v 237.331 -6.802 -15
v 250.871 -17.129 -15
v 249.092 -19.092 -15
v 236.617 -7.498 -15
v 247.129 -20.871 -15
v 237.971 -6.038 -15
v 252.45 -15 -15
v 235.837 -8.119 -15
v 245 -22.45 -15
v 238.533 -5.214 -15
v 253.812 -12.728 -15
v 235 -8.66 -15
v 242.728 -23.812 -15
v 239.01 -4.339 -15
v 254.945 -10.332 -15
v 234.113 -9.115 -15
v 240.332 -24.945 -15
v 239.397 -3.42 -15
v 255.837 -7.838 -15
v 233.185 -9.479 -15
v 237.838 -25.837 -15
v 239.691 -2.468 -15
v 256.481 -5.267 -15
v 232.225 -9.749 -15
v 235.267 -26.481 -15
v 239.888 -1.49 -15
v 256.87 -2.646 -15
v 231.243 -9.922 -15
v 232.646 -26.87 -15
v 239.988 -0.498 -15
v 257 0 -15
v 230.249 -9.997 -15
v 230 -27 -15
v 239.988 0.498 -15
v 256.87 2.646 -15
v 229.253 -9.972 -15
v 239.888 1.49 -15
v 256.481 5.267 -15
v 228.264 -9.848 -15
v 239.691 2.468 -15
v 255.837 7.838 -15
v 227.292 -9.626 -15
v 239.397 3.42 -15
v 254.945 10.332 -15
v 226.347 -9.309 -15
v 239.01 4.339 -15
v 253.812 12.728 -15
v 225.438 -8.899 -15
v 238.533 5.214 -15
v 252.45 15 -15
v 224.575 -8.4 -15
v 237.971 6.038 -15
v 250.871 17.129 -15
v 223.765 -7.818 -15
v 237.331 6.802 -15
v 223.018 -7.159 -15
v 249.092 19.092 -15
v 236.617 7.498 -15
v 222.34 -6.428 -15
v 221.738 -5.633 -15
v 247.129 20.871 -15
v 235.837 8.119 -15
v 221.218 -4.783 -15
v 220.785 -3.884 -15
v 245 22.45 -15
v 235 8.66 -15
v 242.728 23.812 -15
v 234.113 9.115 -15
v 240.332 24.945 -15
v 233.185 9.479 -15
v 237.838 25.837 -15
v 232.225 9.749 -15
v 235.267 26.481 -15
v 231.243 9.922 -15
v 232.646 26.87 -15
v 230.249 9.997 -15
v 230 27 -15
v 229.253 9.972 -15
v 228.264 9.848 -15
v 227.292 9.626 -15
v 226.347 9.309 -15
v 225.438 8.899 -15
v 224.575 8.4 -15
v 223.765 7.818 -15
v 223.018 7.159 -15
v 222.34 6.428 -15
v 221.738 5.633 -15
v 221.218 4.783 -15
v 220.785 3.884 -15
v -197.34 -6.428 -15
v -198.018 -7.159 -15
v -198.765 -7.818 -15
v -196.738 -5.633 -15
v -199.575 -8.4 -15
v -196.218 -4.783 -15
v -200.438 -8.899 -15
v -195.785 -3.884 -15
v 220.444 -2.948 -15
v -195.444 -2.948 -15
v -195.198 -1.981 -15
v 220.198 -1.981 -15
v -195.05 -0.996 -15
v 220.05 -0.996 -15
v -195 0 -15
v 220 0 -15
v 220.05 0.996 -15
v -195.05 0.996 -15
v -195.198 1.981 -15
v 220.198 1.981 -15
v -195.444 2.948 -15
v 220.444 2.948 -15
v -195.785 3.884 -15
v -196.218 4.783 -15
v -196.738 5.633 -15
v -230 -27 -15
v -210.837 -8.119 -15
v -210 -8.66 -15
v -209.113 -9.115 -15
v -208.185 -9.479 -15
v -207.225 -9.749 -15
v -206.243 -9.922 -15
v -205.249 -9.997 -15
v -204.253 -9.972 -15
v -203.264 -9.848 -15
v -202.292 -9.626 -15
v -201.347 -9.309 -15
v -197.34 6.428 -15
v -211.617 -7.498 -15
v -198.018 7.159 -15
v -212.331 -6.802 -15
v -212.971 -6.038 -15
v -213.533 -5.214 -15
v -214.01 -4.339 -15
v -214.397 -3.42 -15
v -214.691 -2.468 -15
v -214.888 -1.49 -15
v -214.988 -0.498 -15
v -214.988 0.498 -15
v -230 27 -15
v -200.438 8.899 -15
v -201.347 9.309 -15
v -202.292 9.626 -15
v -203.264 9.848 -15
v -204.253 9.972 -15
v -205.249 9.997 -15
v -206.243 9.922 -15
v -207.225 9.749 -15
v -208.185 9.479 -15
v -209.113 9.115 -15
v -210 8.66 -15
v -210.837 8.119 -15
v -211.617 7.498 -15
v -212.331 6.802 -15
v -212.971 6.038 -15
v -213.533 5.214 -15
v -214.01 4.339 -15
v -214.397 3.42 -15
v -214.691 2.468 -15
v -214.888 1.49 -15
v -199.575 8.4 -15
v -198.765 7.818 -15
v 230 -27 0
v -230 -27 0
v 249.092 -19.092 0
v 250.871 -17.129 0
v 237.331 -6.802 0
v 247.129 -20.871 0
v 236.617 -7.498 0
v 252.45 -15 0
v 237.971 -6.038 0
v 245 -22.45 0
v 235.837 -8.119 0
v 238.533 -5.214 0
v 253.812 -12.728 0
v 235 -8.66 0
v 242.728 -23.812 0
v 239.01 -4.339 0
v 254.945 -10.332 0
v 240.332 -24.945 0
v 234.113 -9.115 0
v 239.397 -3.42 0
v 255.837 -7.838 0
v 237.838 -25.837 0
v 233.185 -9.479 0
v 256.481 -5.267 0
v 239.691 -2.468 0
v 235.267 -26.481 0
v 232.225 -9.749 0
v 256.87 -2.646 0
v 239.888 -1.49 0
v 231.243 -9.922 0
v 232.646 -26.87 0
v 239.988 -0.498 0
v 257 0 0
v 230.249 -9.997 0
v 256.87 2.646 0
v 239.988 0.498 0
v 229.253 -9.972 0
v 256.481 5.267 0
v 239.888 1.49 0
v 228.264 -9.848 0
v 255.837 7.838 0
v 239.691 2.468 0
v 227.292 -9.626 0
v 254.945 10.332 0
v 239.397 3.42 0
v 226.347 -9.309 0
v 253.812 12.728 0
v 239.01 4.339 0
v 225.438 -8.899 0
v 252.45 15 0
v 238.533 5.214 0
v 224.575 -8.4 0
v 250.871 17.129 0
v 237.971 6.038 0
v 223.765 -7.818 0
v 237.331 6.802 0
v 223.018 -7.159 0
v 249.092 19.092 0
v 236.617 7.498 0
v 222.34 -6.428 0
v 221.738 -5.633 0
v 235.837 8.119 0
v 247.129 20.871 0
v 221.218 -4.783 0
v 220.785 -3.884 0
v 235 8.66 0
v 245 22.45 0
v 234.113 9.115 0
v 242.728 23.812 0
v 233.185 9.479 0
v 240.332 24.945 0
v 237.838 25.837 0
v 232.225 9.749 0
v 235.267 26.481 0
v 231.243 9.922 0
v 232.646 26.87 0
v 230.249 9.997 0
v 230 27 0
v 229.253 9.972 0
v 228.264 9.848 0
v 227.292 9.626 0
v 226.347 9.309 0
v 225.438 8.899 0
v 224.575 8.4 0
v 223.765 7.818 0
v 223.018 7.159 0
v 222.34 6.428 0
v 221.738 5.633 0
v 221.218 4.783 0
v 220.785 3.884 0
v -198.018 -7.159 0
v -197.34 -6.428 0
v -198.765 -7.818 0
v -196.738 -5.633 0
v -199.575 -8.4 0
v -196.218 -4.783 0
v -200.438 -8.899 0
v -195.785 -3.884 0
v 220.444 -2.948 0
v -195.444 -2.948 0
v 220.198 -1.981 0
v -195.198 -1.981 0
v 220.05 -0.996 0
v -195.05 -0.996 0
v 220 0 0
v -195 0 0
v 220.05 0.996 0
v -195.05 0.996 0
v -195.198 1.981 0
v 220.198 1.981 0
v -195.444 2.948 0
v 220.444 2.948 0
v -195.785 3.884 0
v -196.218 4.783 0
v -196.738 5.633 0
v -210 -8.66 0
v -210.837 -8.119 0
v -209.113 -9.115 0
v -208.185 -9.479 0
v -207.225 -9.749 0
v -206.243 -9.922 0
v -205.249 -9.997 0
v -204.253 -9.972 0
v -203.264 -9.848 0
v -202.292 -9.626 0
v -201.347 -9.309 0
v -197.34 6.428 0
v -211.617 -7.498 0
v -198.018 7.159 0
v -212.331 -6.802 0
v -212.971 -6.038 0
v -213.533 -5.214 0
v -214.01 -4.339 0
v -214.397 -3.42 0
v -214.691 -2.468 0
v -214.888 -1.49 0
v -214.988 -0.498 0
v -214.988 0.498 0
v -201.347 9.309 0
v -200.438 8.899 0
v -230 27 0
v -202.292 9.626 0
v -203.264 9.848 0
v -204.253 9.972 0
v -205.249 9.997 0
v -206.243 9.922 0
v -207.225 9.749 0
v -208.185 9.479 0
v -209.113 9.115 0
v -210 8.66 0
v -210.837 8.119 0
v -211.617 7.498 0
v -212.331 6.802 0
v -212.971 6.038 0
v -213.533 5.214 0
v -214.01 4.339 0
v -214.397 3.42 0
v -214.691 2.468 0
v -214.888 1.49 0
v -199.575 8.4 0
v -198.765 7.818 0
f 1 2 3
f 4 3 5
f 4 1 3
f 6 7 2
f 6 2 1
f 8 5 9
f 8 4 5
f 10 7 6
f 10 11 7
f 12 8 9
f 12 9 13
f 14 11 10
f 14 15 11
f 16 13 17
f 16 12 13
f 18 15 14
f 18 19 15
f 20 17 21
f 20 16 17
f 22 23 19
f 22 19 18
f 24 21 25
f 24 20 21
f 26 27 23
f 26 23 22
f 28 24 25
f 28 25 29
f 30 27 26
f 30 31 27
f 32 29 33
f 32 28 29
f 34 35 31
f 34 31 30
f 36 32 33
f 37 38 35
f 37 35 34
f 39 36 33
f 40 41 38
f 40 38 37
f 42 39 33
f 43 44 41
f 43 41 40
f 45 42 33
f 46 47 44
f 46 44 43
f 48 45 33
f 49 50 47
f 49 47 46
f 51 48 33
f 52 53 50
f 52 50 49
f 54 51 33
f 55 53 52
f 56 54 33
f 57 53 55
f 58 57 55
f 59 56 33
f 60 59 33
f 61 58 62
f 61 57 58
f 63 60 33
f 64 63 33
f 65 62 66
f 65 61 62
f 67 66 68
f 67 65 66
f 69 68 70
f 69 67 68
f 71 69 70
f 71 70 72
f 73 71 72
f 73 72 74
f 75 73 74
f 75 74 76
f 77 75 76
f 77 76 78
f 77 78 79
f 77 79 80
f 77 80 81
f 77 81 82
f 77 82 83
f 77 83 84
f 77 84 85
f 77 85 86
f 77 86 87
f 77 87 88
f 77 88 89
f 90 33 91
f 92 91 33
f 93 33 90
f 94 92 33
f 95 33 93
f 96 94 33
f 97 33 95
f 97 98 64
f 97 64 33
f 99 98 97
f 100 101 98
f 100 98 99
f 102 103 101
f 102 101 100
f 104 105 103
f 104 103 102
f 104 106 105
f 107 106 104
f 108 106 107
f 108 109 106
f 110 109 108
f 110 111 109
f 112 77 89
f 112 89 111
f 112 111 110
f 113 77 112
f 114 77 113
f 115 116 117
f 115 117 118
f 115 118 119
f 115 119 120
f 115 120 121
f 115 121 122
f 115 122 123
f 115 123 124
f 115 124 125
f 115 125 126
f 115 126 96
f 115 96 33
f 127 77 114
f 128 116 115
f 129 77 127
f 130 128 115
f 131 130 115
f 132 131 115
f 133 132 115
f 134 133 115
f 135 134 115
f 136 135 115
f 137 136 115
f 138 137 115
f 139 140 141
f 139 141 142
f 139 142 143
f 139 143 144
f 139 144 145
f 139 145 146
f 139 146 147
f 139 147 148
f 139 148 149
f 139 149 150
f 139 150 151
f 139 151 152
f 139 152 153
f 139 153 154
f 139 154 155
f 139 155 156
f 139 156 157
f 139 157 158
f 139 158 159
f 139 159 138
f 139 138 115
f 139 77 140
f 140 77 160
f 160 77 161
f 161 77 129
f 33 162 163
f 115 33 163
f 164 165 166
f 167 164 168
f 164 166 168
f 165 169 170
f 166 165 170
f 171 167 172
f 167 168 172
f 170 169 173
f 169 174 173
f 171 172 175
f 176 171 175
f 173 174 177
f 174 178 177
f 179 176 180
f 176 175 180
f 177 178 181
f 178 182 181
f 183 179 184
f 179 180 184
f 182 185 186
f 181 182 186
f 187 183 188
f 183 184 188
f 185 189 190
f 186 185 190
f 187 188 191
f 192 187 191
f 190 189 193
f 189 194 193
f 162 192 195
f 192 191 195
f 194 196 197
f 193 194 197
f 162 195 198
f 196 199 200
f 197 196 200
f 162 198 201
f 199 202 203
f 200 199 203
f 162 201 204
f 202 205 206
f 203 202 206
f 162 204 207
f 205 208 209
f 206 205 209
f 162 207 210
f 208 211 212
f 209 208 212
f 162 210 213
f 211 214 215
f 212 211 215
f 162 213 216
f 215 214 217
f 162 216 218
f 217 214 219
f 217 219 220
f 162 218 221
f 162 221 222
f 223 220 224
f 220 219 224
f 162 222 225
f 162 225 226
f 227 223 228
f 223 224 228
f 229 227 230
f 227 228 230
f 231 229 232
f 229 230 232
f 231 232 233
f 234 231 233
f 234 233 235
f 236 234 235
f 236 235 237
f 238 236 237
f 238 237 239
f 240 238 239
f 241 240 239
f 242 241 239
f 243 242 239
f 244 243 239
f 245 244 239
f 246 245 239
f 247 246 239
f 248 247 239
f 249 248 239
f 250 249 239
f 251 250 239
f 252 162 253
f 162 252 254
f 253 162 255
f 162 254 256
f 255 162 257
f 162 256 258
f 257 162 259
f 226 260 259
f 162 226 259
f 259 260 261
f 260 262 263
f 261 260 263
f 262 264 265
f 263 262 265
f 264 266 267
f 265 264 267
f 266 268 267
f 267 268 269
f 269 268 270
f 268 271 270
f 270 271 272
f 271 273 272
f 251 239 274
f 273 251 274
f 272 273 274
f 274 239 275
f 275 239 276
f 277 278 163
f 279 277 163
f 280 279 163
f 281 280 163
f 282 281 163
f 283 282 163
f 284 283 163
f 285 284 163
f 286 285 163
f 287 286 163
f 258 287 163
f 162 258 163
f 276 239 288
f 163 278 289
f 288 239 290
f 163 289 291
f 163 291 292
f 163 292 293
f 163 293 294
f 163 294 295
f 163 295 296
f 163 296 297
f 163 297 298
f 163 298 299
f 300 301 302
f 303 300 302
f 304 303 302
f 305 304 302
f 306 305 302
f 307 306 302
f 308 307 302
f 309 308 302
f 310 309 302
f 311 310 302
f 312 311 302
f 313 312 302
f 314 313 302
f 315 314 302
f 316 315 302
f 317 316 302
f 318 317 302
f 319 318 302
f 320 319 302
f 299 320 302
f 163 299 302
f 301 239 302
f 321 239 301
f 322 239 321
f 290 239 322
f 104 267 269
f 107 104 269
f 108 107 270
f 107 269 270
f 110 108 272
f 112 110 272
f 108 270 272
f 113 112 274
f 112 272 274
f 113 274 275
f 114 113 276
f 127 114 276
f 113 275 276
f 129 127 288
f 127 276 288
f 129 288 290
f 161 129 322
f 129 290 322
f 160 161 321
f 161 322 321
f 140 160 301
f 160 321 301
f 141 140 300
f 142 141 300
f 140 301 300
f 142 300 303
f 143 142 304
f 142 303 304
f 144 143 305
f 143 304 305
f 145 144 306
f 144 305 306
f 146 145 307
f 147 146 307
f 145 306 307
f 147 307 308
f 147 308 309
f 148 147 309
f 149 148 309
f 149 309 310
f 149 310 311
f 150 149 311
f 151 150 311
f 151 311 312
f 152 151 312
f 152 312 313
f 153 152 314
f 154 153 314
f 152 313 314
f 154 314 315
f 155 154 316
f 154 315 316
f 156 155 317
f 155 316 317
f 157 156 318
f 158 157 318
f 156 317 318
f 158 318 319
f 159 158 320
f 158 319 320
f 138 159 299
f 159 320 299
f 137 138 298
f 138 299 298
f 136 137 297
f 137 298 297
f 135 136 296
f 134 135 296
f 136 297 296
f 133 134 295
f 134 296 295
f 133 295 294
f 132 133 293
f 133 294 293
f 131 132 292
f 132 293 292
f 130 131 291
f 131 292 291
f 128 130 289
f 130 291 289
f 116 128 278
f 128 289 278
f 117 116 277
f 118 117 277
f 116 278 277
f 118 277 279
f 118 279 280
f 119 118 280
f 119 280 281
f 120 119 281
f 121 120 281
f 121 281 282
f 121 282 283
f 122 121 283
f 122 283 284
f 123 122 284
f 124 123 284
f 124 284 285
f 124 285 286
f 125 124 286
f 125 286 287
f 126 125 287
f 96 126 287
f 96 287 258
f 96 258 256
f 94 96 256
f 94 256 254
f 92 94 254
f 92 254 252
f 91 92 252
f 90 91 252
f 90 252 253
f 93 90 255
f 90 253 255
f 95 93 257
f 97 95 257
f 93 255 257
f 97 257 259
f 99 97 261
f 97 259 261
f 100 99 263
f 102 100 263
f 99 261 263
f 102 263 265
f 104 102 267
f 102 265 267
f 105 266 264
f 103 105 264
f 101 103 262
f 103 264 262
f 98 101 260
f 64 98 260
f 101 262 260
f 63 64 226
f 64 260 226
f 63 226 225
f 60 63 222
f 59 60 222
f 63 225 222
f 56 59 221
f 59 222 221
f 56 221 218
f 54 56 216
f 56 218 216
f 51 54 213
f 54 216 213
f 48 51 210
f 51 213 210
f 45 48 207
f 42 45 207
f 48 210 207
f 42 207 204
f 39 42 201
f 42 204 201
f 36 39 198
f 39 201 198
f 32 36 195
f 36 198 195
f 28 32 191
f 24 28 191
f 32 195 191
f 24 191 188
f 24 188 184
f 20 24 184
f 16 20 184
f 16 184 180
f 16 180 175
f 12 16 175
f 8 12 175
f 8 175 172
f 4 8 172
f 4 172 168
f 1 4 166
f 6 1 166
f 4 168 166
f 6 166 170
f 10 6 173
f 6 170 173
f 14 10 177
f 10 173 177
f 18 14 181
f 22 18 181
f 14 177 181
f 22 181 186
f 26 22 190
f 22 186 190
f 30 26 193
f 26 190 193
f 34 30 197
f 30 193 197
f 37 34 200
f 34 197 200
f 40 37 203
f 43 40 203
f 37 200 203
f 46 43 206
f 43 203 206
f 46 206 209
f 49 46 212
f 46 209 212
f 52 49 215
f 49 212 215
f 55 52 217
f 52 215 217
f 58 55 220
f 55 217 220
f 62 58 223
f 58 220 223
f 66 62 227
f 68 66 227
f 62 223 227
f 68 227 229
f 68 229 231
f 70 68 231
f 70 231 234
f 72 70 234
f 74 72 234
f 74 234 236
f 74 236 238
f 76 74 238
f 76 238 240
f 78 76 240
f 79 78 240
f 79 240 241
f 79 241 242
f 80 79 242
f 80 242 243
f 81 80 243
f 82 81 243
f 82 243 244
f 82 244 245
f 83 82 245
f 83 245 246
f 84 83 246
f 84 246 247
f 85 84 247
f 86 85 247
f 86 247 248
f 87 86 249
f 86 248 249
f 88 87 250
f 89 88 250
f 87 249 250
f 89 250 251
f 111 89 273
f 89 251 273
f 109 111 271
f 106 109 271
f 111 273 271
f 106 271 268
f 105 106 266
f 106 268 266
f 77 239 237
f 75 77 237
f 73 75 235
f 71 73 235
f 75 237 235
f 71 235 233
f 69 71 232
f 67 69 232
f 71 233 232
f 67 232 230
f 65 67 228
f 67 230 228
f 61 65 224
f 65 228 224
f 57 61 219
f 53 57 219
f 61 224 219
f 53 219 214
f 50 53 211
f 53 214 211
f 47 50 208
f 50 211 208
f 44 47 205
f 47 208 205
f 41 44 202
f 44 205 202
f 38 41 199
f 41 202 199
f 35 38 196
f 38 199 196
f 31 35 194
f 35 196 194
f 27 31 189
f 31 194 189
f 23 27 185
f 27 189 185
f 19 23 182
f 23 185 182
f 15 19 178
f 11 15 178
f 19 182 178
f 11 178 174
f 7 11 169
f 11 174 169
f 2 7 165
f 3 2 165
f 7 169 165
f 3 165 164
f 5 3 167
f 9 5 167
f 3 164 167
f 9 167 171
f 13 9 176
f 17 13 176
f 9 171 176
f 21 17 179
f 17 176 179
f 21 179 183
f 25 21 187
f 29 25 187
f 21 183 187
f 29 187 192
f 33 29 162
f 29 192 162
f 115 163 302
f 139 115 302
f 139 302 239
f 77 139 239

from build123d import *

# Parameters (mm, degrees)
SKETCH2_R           = 10
BOSS_EXTRUDE2_DEPTH = 15


with BuildPart() as part:
    # Sketch2 → Boss-Extrude2 (new body)
    with BuildSketch(Plane.XY):
        with BuildLine():
            Line((-230, 27), (230, 27))
            ThreePointArc((230, 27), (257, 0), (230, -27))
            Line((230, -27), (-230, -27))
            Line((-230, -27), (-230, 27))
        make_face()
        with Locations(Location((230, 0, 0), (0, 0, 180))):
            Circle(SKETCH2_R, mode=Mode.SUBTRACT)
        with Locations((-205, 0)):
            Circle(SKETCH2_R, mode=Mode.SUBTRACT)
    extrude(amount=-BOSS_EXTRUDE2_DEPTH)


solid = part.part
